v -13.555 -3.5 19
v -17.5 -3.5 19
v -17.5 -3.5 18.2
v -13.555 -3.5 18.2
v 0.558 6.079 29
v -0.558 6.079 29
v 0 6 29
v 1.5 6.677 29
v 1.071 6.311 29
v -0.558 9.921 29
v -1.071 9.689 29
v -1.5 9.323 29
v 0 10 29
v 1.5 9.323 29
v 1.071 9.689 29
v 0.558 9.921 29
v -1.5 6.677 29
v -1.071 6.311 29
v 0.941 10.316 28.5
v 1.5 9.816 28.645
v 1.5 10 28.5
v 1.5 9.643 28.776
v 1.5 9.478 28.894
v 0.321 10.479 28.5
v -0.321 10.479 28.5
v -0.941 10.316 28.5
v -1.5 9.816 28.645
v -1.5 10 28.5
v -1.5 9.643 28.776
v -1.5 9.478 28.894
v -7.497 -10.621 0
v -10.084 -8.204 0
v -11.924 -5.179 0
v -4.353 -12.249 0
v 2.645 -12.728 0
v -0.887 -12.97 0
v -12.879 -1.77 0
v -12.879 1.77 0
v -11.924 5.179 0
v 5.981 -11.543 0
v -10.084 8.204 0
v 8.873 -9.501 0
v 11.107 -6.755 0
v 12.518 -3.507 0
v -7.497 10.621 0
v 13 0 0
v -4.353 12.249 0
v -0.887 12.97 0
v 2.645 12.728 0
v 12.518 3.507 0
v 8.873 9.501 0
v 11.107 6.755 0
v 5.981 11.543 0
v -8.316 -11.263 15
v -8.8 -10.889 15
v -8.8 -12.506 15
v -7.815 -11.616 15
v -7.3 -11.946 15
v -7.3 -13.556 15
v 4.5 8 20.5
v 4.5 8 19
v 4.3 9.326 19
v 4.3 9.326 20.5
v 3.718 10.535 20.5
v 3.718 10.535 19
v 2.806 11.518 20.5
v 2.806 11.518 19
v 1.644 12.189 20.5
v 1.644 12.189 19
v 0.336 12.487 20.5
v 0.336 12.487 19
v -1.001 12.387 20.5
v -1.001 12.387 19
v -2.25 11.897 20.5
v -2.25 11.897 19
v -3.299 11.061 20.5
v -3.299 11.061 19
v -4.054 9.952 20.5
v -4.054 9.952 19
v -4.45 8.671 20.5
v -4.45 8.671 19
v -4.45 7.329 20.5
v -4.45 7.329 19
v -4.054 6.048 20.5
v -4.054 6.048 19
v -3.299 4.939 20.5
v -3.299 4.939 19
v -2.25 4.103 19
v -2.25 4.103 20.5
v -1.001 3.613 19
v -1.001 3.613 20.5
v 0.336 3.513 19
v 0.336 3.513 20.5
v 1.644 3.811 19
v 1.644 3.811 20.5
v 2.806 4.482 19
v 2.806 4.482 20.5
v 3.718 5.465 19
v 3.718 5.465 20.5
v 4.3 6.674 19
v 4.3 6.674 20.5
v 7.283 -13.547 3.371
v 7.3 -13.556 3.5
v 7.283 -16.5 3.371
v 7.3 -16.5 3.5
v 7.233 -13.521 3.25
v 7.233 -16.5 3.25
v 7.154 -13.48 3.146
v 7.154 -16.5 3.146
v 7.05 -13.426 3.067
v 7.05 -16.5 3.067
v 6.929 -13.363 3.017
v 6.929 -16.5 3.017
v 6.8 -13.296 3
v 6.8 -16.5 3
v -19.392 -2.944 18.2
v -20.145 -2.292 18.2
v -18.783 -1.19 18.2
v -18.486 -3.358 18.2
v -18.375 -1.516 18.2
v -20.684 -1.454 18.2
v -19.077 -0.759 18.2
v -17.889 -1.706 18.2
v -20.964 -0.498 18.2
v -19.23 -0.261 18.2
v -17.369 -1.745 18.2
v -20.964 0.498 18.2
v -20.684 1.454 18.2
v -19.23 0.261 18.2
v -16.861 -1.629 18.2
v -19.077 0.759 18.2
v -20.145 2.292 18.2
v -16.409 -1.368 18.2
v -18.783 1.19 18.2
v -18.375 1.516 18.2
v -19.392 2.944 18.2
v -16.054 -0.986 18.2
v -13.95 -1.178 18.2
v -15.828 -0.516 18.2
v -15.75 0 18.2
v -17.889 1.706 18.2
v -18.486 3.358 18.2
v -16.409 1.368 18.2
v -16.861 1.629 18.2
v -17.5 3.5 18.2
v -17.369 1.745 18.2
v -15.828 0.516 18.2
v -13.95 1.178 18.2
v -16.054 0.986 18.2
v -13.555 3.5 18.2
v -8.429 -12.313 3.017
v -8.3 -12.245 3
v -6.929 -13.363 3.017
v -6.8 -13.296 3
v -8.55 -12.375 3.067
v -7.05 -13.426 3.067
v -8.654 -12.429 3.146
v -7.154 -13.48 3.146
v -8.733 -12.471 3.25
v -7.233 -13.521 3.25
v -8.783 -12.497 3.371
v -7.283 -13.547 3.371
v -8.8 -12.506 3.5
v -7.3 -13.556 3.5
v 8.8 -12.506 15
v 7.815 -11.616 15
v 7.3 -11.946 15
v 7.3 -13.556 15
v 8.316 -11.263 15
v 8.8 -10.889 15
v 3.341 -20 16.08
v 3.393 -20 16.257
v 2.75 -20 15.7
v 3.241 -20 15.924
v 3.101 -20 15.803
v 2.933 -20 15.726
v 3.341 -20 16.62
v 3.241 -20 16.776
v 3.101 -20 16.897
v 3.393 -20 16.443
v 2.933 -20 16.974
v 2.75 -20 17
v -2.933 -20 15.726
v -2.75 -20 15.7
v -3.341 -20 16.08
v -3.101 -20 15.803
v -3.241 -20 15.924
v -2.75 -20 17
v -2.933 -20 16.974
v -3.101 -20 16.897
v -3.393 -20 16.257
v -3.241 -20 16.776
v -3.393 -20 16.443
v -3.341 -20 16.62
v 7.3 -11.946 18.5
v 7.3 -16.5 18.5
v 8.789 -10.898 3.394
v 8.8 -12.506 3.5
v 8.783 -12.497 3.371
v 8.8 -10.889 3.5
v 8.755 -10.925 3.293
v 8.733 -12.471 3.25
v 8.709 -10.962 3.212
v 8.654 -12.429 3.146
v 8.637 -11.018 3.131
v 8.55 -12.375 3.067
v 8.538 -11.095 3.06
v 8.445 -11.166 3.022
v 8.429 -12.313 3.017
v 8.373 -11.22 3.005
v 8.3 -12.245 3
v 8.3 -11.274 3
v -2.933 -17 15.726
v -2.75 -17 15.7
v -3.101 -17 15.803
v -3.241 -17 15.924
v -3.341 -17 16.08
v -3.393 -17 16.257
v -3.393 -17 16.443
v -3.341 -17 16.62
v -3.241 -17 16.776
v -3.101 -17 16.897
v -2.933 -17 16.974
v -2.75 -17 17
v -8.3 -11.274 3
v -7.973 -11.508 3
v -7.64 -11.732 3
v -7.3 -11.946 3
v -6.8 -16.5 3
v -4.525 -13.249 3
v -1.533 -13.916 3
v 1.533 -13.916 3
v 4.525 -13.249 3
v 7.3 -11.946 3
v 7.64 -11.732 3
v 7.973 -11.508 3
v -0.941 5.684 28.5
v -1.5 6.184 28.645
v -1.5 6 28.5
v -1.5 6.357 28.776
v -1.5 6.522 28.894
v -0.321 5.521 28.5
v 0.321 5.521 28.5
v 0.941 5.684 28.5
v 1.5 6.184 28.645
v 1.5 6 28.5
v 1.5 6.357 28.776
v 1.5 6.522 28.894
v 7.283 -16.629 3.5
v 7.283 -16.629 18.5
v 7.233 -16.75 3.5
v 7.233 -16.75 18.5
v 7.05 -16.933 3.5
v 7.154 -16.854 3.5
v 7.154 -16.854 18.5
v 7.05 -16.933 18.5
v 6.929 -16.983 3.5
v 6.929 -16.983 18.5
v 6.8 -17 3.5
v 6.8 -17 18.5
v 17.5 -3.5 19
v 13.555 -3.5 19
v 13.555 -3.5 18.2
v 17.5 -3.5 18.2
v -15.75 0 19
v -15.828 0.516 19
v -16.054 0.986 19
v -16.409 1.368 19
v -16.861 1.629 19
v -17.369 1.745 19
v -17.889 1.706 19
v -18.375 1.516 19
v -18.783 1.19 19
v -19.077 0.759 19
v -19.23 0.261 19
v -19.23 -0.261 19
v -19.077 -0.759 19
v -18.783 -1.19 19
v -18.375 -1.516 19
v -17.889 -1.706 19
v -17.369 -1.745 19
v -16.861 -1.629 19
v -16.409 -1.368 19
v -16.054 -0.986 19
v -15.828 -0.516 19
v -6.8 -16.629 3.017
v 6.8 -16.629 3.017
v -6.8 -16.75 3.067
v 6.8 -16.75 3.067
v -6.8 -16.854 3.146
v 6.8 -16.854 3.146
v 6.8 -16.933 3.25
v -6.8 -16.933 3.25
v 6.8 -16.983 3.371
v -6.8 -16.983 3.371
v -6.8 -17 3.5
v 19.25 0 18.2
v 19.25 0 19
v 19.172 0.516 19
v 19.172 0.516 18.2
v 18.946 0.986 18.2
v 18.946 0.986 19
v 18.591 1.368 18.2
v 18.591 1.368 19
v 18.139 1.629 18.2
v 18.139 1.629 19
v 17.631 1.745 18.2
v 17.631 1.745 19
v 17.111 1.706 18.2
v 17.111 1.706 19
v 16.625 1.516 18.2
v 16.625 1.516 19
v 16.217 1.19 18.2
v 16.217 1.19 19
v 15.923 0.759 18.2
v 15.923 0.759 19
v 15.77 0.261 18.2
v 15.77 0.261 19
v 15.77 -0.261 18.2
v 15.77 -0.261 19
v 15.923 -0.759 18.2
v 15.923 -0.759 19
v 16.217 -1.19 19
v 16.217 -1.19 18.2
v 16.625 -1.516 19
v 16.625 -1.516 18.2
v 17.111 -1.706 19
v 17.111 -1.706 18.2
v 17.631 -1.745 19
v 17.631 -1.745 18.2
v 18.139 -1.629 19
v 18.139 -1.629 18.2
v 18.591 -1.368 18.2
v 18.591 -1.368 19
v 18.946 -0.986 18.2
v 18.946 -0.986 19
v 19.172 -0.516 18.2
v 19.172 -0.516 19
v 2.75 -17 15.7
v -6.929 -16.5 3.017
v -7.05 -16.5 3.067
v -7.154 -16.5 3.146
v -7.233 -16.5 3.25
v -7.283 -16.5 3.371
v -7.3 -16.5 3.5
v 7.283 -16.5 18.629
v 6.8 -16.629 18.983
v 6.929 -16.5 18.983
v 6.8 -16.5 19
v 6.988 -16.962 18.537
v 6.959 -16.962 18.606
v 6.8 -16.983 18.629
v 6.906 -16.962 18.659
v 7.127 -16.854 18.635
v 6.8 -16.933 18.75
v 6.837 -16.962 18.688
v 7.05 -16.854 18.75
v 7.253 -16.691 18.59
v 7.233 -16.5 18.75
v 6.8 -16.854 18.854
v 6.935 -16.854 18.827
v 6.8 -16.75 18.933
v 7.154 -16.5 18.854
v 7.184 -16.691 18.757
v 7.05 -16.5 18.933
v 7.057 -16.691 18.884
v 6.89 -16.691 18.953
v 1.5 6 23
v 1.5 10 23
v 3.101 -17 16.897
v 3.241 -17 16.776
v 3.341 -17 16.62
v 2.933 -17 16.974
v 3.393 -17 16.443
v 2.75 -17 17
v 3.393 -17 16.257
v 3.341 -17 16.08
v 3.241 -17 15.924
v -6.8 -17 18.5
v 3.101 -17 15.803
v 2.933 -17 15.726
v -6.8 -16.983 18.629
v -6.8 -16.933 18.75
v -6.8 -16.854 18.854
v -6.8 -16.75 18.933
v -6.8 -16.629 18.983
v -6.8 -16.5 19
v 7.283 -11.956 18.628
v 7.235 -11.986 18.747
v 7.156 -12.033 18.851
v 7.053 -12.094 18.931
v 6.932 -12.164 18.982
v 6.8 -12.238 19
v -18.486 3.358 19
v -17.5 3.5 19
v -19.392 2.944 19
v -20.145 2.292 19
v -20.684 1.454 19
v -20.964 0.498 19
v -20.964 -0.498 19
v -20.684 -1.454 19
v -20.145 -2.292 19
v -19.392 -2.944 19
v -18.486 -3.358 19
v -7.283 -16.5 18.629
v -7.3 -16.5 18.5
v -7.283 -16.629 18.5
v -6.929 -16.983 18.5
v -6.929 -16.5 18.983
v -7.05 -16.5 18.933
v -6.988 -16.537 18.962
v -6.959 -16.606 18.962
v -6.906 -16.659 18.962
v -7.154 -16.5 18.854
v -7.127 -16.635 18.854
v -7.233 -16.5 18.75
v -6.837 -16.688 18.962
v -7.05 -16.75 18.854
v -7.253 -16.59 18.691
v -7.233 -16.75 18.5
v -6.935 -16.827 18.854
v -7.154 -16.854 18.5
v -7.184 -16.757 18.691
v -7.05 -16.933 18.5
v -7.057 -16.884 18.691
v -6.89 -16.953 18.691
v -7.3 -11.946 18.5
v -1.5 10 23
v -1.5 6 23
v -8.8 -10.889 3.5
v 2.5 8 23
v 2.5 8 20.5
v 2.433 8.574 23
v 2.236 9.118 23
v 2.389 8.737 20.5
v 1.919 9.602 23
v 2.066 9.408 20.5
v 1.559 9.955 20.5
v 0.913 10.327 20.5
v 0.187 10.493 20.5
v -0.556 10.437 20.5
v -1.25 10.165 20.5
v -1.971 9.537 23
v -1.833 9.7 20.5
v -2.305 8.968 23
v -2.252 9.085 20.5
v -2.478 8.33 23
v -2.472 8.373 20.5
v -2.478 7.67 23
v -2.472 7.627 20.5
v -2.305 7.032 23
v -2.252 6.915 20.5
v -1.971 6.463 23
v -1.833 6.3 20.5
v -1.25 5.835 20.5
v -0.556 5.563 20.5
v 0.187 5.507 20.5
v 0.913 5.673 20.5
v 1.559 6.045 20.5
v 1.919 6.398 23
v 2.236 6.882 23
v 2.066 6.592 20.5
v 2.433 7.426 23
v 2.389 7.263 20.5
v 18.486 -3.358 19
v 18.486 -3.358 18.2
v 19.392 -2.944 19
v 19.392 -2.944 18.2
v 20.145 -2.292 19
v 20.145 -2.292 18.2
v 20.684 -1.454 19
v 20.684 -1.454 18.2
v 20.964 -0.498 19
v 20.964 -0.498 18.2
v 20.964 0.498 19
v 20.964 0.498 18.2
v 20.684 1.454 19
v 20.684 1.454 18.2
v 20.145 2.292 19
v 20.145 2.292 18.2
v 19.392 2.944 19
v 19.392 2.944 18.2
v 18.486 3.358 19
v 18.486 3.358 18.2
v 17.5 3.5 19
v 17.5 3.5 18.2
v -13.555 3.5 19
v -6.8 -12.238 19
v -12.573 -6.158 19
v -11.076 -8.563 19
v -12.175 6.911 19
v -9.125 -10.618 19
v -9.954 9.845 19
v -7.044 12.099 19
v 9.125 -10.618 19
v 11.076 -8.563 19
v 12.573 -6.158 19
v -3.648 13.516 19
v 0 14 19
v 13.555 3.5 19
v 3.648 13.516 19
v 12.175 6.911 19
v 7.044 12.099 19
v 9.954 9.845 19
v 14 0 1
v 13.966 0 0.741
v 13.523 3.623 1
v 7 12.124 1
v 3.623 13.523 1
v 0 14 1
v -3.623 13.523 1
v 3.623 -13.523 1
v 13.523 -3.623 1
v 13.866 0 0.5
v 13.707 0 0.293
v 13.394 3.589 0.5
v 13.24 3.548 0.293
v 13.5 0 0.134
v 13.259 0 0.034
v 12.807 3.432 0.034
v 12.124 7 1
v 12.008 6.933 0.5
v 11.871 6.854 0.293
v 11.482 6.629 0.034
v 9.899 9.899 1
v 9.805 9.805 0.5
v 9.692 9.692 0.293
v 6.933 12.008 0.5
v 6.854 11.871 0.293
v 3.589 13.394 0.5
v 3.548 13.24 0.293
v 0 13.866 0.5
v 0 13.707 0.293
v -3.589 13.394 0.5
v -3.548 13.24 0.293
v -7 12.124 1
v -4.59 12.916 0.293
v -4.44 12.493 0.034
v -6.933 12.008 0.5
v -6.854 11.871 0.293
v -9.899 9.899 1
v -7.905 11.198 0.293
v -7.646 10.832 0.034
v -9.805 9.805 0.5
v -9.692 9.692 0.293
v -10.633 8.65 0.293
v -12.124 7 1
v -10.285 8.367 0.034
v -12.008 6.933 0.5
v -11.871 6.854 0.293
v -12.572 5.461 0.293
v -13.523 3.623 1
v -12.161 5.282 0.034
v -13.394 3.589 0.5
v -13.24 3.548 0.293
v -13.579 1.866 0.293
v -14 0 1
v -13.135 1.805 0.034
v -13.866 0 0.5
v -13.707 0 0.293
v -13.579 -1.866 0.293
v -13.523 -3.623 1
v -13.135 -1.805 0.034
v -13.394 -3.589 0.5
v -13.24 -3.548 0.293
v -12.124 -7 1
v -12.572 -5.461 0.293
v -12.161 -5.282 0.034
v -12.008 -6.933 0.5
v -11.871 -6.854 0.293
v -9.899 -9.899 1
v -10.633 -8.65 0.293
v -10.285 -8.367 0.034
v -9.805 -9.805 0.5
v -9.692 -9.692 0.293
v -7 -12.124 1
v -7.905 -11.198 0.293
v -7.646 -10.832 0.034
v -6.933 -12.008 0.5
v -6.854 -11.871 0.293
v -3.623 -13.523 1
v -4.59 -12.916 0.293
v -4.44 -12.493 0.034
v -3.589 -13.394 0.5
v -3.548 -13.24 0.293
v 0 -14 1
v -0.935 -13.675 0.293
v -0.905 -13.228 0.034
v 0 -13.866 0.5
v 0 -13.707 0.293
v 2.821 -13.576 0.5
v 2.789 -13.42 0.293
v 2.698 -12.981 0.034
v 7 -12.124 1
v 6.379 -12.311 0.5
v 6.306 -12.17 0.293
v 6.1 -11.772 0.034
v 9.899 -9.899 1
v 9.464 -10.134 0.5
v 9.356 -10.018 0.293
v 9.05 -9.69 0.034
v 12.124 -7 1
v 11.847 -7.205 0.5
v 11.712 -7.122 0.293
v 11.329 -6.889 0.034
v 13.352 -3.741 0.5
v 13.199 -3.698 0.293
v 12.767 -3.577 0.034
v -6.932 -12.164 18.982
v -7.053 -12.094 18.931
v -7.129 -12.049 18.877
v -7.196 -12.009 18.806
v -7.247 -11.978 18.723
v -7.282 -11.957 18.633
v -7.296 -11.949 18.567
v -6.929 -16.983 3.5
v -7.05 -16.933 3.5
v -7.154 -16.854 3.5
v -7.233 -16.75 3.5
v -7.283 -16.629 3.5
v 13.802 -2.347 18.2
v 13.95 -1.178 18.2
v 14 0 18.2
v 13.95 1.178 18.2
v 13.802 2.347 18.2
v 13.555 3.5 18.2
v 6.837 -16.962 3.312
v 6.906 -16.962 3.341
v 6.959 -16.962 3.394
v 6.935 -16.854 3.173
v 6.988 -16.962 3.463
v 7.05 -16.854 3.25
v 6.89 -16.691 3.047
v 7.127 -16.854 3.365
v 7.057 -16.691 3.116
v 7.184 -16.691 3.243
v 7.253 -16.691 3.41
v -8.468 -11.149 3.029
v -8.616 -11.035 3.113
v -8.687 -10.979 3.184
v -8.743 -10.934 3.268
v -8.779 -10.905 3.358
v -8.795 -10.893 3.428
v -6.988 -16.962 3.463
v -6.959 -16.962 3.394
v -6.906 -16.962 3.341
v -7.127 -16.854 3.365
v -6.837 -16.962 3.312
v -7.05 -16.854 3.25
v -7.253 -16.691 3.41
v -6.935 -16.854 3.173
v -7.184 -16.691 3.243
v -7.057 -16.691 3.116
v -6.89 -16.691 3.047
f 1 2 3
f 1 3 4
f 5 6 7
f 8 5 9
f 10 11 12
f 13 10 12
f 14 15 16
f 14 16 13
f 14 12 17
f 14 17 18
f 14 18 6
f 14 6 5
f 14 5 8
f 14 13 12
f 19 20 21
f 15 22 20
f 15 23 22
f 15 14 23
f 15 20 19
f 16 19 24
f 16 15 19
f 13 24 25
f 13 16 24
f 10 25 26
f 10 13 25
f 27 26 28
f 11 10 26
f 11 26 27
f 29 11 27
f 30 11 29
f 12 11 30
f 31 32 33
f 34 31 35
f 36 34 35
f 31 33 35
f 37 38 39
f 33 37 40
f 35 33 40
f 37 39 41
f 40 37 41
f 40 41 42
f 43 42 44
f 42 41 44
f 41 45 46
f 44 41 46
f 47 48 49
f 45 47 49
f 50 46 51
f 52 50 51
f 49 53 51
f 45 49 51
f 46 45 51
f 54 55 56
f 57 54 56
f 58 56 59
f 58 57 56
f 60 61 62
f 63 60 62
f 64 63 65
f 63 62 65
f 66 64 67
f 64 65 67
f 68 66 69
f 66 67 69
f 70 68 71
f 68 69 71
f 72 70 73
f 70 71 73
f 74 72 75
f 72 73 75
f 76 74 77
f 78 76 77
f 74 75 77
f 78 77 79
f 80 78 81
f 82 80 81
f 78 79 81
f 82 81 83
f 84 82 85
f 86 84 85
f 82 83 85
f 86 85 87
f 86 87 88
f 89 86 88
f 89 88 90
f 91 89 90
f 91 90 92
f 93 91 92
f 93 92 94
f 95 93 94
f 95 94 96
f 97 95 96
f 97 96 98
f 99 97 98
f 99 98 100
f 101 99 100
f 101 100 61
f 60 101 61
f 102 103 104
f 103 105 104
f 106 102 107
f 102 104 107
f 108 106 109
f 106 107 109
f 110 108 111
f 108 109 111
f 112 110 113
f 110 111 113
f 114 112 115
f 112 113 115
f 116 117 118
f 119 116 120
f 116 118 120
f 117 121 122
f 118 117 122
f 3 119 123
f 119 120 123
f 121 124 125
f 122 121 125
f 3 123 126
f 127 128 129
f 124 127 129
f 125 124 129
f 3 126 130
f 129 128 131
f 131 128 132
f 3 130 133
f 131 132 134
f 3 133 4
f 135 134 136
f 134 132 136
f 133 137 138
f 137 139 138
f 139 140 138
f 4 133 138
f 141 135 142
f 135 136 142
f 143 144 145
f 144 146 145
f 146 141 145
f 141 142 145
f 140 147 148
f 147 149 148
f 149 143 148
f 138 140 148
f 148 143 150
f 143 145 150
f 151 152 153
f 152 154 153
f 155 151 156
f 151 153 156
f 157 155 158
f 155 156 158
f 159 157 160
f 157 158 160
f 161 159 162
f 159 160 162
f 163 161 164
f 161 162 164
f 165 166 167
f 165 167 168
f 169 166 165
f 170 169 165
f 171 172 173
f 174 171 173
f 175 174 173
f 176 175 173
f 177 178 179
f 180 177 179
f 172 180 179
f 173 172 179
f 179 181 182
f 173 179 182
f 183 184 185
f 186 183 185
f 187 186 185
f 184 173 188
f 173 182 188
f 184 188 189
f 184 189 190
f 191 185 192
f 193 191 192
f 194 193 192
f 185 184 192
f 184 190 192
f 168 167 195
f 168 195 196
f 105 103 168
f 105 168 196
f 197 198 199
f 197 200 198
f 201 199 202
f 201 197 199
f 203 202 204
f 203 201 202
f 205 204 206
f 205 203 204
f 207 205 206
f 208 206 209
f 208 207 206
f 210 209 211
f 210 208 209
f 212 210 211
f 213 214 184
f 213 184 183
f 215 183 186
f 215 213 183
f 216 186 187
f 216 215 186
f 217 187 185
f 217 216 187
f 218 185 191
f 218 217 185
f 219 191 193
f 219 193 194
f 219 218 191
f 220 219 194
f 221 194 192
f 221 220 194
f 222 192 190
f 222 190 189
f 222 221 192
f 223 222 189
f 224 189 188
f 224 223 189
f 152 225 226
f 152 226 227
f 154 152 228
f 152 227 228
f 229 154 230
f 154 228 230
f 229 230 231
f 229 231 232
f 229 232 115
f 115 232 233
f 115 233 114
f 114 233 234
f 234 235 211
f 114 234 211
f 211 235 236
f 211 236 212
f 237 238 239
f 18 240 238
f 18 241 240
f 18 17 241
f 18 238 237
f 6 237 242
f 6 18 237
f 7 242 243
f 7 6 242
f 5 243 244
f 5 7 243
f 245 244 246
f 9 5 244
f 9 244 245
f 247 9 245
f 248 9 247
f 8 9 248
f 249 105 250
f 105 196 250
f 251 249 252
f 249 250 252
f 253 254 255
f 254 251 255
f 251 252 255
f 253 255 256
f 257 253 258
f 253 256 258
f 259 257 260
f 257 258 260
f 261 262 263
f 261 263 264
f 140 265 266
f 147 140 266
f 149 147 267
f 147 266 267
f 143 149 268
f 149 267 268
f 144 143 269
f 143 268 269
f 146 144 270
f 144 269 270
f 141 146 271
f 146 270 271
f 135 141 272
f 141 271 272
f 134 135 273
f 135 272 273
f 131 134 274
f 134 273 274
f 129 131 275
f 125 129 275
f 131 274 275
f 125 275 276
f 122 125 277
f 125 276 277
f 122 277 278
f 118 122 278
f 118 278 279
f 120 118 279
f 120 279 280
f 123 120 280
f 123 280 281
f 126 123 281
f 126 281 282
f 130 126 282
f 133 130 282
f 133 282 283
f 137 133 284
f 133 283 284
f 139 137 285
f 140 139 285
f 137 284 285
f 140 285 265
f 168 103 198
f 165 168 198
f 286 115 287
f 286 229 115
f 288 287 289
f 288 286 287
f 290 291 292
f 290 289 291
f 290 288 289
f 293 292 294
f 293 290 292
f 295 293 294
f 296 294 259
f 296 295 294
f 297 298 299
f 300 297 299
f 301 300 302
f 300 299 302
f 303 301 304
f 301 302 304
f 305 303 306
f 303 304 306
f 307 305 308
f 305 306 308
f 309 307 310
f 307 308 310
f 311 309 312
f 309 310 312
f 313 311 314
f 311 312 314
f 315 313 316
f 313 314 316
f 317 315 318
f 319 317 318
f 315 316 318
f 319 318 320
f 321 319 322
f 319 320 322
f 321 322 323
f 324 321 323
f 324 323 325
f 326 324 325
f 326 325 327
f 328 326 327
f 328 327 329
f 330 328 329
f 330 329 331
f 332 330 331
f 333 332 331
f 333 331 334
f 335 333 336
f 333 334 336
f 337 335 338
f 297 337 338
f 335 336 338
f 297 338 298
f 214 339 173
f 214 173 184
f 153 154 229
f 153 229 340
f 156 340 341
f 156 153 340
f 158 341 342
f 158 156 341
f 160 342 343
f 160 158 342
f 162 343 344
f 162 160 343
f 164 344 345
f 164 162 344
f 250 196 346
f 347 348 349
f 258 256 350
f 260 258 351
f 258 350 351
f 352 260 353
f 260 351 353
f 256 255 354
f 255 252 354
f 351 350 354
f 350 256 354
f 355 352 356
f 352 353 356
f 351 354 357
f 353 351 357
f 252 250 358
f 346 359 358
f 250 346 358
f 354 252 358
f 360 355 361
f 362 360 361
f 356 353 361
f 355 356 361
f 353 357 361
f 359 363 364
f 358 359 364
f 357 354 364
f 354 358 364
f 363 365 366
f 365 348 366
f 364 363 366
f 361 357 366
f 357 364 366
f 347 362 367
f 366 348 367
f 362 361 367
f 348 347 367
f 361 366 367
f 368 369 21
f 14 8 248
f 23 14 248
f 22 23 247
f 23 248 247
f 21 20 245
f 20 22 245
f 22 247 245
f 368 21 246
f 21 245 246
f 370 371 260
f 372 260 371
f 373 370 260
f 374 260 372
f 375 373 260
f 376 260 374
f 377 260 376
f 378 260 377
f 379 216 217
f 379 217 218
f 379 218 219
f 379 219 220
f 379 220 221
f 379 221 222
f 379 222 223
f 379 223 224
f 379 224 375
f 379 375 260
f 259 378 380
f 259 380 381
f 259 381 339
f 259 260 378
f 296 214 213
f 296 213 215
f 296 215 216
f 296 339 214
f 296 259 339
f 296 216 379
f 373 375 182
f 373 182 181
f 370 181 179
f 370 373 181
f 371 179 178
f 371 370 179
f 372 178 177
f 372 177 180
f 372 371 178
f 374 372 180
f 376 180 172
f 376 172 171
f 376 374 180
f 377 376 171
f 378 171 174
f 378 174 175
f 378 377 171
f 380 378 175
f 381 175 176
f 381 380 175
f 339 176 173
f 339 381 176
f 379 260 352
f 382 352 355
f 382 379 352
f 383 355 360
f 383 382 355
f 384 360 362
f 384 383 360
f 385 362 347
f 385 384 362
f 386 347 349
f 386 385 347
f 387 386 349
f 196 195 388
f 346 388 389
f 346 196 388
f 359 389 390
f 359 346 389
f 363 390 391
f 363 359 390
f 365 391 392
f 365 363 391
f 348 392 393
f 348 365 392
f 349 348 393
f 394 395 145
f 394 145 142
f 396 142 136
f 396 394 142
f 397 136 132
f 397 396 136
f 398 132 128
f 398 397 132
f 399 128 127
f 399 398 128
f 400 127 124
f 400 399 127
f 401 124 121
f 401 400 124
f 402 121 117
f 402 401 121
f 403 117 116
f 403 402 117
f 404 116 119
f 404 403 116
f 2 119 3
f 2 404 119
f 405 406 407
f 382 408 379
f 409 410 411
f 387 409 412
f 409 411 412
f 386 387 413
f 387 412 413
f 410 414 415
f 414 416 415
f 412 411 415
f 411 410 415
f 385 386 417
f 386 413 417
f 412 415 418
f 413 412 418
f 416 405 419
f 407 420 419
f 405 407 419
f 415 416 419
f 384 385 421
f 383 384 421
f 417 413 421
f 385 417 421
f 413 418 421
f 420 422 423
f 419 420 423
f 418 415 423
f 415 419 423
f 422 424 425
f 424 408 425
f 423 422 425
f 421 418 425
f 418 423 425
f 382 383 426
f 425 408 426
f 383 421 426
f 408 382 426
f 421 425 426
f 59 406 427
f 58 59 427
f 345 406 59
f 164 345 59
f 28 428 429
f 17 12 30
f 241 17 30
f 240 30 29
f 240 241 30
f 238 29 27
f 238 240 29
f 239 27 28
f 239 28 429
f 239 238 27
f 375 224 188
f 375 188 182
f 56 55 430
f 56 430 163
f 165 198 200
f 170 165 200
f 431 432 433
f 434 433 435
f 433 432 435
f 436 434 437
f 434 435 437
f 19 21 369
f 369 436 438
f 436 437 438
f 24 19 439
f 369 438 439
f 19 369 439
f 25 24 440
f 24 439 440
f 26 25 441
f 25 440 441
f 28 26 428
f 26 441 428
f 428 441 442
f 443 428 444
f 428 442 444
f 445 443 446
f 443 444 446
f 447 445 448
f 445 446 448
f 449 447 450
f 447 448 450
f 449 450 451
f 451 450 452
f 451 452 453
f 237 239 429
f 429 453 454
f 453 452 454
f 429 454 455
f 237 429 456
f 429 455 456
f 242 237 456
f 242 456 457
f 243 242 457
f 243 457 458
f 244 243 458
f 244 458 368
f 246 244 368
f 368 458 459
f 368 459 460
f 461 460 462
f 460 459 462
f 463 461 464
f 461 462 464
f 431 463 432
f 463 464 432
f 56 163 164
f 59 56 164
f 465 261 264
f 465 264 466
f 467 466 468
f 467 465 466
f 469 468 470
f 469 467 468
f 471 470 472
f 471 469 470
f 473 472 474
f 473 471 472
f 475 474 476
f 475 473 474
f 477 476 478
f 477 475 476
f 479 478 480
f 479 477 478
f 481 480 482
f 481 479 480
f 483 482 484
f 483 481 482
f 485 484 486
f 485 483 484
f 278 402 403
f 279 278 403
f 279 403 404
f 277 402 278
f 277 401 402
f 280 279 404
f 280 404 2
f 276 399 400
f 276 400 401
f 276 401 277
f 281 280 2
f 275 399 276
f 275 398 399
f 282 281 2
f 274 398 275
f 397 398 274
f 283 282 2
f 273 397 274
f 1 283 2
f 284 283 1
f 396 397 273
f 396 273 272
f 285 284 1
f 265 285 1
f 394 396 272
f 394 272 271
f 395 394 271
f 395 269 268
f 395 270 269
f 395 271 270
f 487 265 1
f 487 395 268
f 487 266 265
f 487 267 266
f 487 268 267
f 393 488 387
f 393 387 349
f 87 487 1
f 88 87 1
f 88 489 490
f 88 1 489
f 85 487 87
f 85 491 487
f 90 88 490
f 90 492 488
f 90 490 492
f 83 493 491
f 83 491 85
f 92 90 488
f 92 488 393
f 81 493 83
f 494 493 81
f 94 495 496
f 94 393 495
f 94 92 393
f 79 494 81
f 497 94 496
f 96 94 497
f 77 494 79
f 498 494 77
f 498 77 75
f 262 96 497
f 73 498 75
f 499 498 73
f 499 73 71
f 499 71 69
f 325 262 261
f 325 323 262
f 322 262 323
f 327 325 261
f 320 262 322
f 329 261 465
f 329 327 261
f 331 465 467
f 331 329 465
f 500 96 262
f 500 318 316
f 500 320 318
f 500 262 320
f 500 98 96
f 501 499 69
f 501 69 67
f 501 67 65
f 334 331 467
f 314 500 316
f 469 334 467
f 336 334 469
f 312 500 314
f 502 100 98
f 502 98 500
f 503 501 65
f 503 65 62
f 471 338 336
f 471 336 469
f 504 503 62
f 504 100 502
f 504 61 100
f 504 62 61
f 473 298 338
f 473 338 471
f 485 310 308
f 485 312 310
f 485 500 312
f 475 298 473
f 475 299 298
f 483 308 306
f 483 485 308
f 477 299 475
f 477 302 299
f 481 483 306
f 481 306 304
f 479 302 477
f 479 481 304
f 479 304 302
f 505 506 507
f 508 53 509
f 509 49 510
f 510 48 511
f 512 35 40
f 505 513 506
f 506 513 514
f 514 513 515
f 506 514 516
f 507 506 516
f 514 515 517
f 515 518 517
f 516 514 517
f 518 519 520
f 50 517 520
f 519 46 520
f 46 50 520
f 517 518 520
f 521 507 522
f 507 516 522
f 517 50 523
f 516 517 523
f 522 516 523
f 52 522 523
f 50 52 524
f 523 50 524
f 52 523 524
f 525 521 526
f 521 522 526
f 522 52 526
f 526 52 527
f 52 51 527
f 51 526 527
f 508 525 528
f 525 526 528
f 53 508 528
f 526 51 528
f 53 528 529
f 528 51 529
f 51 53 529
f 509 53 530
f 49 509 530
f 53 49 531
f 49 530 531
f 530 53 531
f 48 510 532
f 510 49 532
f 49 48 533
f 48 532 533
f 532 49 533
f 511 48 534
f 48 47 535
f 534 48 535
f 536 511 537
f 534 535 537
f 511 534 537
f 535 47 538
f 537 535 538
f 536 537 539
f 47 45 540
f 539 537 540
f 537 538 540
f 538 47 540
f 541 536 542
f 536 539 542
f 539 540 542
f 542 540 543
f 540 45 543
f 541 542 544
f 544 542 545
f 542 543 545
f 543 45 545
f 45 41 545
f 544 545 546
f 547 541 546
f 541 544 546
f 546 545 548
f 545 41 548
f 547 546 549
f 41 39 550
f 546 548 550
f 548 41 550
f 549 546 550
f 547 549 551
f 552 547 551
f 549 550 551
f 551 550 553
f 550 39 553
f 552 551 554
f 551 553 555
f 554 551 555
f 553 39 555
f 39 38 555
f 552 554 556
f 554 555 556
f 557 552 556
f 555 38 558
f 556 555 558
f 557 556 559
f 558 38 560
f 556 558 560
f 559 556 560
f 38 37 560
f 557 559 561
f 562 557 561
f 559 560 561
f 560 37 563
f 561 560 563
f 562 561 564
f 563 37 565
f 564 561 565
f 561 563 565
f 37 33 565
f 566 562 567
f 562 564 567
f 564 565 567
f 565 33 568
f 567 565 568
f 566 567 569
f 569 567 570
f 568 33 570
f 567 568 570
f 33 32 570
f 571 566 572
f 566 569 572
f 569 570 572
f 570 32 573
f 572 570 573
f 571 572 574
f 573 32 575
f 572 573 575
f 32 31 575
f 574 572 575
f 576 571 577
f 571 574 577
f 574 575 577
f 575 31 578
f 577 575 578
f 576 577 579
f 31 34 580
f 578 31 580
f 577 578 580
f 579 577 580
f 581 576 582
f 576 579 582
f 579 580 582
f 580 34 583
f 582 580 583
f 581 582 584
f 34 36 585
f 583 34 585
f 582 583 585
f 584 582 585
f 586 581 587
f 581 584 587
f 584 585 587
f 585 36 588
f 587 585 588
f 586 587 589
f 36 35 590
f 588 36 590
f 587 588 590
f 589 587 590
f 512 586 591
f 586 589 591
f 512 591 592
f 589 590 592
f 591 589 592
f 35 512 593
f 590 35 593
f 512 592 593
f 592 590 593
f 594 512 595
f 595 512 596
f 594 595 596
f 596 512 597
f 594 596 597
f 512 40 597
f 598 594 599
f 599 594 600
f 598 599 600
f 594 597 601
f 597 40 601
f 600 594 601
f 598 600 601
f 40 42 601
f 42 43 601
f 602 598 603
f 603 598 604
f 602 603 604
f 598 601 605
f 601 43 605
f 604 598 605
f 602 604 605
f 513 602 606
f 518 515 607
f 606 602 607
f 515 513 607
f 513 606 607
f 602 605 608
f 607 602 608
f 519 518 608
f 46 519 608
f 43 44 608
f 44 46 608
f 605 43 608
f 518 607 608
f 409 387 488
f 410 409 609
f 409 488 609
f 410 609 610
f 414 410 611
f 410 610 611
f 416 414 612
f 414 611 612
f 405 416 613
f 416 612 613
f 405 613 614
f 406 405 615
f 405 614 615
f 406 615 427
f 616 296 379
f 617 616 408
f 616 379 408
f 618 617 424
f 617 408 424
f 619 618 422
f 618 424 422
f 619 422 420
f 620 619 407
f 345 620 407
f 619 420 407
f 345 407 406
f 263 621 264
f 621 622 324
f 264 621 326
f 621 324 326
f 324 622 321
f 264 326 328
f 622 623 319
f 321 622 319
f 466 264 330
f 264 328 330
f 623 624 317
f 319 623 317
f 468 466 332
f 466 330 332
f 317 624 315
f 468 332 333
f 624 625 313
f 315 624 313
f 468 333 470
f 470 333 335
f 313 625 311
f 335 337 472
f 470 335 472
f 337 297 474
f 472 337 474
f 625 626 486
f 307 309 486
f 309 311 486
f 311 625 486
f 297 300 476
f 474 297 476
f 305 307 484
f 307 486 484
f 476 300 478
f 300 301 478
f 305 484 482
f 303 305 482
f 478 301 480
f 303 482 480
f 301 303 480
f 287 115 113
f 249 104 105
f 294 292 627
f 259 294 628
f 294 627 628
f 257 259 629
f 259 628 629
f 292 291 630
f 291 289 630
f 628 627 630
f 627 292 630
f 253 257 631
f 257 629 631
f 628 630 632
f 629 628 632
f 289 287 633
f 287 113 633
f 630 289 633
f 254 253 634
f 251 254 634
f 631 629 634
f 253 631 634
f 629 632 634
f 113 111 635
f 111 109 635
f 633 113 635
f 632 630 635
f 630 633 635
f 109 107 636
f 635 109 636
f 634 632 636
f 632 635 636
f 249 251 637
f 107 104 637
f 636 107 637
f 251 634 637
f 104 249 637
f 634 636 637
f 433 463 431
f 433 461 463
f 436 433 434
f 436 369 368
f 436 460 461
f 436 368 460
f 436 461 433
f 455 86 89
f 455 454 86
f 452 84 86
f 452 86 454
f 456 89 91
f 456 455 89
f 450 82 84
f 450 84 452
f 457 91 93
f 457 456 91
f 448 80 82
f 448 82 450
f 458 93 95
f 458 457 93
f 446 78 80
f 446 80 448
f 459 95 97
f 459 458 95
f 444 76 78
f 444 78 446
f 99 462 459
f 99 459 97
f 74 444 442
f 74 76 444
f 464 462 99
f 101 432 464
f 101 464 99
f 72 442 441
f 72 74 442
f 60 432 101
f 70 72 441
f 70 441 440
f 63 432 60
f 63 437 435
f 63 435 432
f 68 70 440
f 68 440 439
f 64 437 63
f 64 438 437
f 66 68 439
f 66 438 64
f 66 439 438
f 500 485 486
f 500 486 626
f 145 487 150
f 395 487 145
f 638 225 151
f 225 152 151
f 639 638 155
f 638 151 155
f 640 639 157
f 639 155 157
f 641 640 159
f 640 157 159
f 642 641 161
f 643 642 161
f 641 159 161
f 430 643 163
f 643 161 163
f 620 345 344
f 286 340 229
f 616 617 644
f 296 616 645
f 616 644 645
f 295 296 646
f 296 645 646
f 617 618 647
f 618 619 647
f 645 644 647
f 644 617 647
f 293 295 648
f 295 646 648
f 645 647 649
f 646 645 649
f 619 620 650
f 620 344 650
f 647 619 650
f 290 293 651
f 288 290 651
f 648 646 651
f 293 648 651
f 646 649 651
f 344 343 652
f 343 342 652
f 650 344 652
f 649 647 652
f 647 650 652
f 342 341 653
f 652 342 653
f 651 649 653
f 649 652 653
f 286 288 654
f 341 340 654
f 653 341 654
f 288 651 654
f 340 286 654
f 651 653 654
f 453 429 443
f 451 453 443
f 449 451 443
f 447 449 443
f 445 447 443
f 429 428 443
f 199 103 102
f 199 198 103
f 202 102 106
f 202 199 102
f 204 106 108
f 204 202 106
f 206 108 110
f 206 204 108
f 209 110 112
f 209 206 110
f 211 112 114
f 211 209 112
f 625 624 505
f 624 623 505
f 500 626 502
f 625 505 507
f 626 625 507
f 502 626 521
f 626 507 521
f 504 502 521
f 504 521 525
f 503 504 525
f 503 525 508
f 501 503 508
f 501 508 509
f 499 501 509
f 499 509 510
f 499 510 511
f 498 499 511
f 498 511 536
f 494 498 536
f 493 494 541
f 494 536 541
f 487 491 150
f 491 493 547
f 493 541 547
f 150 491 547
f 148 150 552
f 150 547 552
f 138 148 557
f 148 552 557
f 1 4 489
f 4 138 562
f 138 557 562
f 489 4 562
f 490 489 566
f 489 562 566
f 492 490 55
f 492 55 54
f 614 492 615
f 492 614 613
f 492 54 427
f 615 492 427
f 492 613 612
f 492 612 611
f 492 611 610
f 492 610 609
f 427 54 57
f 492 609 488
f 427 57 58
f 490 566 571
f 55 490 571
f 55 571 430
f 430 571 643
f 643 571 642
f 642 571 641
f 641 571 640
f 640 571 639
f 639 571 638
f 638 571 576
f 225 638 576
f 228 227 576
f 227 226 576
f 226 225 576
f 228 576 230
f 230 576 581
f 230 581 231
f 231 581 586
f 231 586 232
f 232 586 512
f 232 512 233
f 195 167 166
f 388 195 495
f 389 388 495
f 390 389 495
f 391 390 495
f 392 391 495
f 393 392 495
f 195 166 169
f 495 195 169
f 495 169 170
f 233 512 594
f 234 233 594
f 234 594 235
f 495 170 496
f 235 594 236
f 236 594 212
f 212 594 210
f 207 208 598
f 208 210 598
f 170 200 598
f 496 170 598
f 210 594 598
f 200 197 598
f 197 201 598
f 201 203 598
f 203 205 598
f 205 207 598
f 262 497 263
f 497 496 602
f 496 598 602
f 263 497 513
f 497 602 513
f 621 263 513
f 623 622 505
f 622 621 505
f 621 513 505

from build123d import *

# Parameters (mm, degrees)
ESBO_O1_R                = 14
RESSALTO_EXTRUS_O1_DEPTH = 19
ESBO_O2_R                = 4.5
RESSALTO_EXTRUS_O2_DEPTH = 1.5
ESBO_O3_R                = 2.5
RESSALTO_EXTRUS_O3_DEPTH = 10
CORTE_EXTRUS_O1_DEPTH    = 6
CHANFRO2_SIZE            = 0.5
ESBO_O6_R                = 1.75
RESSALTO_EXTRUS_O5_DEPTH = 0.8
FILETE1_R                = 1
RESSALTO_EXTRUS_O6_START = -16
RESSALTO_EXTRUS_O6_DEPTH = 16
RESSALTO_EXTRUS_O7_DEPTH = 12
FILETE2_R                = 0.5
RESSALTO_EXTRUS_O8_DEPTH = 3


with BuildPart() as part:
    # Esboço1 → Ressalto-extrusão1 (new body)
    with BuildSketch(Plane.XY):
        Circle(ESBO_O1_R)
    extrude(amount=RESSALTO_EXTRUS_O1_DEPTH)

    # Esboço2 → Ressalto-extrusão2 (add)
    with BuildSketch(Plane.XY.offset(19)):
        with Locations((0, 8)):
            Circle(ESBO_O2_R)
    extrude(amount=RESSALTO_EXTRUS_O2_DEPTH)

    # Esboço3 → Ressalto-extrusão3 (add)
    with BuildSketch(Plane.XY.offset(19)):
        with Locations((0, 8)):
            Circle(ESBO_O3_R)
    extrude(amount=RESSALTO_EXTRUS_O3_DEPTH)

    # Esboço5 → Corte-extrusão1 (cut)
    with BuildSketch(Plane.XY.offset(29)):
        with BuildLine():
            Line((-1.5, 10.58624067), (-1.5, 5.41375933))
            ThreePointArc((-1.5, 5.41375933), (-2.989755977, 8), (-1.5, 10.58624067))
        make_face()
        with BuildLine():
            Line((1.5, 10.58624067), (1.5, 5.41375933))
            ThreePointArc((1.5, 5.41375933), (2.989755977, 8), (1.5, 10.58624067))
        make_face()
    extrude(amount=-CORTE_EXTRUS_O1_DEPTH, mode=Mode.SUBTRACT)

    # Chanfro2
    chanfro2_edges = [part.edges().sort_by_distance(p)[0] for p in [
        (0, 10.5, 29),
        (0, 5.5, 29),
    ]]
    chamfer(chanfro2_edges, length=CHANFRO2_SIZE)

    # Esboço6 → Ressalto-extrusão5 (add)
    with BuildSketch(Plane.XY.offset(19)):
        with BuildLine():
            Line((17.5, 3.5), (-17.5, 3.5))
            ThreePointArc((-17.5, 3.5), (-21, 0), (-17.5, -3.5))
            Line((-17.5, -3.5), (17.5, -3.5))
            ThreePointArc((17.5, -3.5), (21, 0), (17.5, 3.5))
        make_face()
        with Locations((-17.5, 0)):
            Circle(ESBO_O6_R, mode=Mode.SUBTRACT)
        with Locations((17.5, 0)):
            Circle(ESBO_O6_R, mode=Mode.SUBTRACT)
    extrude(amount=-RESSALTO_EXTRUS_O5_DEPTH)

    # Filete1
    filete1_edges = [part.edges().sort_by_distance(p)[0] for p in [
        (-14, 0, 0),
    ]]
    fillet(filete1_edges, radius=FILETE1_R)

    # Esboço7 → Ressalto-extrusão6 (add)
    with BuildSketch(Plane.XY.offset(19).offset(RESSALTO_EXTRUS_O6_START)):
        with BuildLine():
            Line((7.3, -17), (-7.3, -17))
            Line((-7.3, -17), (-7.3, -11.94612908))
            ThreePointArc((-7.3, -11.94612908), (0, -14), (7.3, -11.94612908))
            Line((7.3, -11.94612908), (7.3, -17))
        make_face()
    extrude(amount=RESSALTO_EXTRUS_O6_DEPTH)

    # Esboço8 → Ressalto-extrusão7 (add)
    with BuildSketch(Plane(origin=(0, 0, 3), x_dir=(-1, 0, 0), z_dir=(0, 0, -1))):
        with BuildLine():
            Line((-7.3, -13.555946275), (-8.8, -12.505634968))
            Line((-8.8, -12.505634968), (-8.8, -10.888526071))
            ThreePointArc((-8.8, -10.888526071), (-8.067349691, -11.441934669), (-7.3, -11.94612908))
            Line((-7.3, -11.94612908), (-7.3, -13.555946275))
        make_face()
        with BuildLine():
            Line((7.3, -13.555946275), (7.3, -11.94612908))
            ThreePointArc((7.3, -11.94612908), (8.067349691, -11.441934669), (8.8, -10.888526071))
            Line((8.8, -10.888526071), (8.8, -12.505634968))
            Line((8.8, -12.505634968), (7.3, -13.555946275))
        make_face()
    extrude(amount=-RESSALTO_EXTRUS_O7_DEPTH)

    # Filete2
    filete2_edges = [part.edges().sort_by_distance(p)[0] for p in [
        (7.3, -14.47306454, 19),
        (-7.3, -15.277973138, 3),
        (8.8, -11.69708052, 3),
        (8.05, -13.030790622, 3),
        (-8.05, -13.030790622, 3),
        (-8.8, -11.69708052, 3),
        (-7.3, -17, 11),
        (7.3, -15.277973138, 3),
        (0, -17, 3),
        (7.3, -17, 11),
        (-7.3, -14.47306454, 19),
        (0, -17, 19),
    ]]
    fillet(filete2_edges, radius=FILETE2_R)

    # Esboço9 → Ressalto-extrusão8 (add)
    with BuildSketch(Plane.XZ.offset(17)):
        with BuildLine():
            Line((-2.75, 17), (2.75, 17))
            ThreePointArc((2.75, 17), (3.4, 16.35), (2.75, 15.7))
            Line((2.75, 15.7), (-2.75, 15.7))
            ThreePointArc((-2.75, 15.7), (-3.4, 16.35), (-2.75, 17))
        make_face()
    extrude(amount=RESSALTO_EXTRUS_O8_DEPTH)


solid = part.part
